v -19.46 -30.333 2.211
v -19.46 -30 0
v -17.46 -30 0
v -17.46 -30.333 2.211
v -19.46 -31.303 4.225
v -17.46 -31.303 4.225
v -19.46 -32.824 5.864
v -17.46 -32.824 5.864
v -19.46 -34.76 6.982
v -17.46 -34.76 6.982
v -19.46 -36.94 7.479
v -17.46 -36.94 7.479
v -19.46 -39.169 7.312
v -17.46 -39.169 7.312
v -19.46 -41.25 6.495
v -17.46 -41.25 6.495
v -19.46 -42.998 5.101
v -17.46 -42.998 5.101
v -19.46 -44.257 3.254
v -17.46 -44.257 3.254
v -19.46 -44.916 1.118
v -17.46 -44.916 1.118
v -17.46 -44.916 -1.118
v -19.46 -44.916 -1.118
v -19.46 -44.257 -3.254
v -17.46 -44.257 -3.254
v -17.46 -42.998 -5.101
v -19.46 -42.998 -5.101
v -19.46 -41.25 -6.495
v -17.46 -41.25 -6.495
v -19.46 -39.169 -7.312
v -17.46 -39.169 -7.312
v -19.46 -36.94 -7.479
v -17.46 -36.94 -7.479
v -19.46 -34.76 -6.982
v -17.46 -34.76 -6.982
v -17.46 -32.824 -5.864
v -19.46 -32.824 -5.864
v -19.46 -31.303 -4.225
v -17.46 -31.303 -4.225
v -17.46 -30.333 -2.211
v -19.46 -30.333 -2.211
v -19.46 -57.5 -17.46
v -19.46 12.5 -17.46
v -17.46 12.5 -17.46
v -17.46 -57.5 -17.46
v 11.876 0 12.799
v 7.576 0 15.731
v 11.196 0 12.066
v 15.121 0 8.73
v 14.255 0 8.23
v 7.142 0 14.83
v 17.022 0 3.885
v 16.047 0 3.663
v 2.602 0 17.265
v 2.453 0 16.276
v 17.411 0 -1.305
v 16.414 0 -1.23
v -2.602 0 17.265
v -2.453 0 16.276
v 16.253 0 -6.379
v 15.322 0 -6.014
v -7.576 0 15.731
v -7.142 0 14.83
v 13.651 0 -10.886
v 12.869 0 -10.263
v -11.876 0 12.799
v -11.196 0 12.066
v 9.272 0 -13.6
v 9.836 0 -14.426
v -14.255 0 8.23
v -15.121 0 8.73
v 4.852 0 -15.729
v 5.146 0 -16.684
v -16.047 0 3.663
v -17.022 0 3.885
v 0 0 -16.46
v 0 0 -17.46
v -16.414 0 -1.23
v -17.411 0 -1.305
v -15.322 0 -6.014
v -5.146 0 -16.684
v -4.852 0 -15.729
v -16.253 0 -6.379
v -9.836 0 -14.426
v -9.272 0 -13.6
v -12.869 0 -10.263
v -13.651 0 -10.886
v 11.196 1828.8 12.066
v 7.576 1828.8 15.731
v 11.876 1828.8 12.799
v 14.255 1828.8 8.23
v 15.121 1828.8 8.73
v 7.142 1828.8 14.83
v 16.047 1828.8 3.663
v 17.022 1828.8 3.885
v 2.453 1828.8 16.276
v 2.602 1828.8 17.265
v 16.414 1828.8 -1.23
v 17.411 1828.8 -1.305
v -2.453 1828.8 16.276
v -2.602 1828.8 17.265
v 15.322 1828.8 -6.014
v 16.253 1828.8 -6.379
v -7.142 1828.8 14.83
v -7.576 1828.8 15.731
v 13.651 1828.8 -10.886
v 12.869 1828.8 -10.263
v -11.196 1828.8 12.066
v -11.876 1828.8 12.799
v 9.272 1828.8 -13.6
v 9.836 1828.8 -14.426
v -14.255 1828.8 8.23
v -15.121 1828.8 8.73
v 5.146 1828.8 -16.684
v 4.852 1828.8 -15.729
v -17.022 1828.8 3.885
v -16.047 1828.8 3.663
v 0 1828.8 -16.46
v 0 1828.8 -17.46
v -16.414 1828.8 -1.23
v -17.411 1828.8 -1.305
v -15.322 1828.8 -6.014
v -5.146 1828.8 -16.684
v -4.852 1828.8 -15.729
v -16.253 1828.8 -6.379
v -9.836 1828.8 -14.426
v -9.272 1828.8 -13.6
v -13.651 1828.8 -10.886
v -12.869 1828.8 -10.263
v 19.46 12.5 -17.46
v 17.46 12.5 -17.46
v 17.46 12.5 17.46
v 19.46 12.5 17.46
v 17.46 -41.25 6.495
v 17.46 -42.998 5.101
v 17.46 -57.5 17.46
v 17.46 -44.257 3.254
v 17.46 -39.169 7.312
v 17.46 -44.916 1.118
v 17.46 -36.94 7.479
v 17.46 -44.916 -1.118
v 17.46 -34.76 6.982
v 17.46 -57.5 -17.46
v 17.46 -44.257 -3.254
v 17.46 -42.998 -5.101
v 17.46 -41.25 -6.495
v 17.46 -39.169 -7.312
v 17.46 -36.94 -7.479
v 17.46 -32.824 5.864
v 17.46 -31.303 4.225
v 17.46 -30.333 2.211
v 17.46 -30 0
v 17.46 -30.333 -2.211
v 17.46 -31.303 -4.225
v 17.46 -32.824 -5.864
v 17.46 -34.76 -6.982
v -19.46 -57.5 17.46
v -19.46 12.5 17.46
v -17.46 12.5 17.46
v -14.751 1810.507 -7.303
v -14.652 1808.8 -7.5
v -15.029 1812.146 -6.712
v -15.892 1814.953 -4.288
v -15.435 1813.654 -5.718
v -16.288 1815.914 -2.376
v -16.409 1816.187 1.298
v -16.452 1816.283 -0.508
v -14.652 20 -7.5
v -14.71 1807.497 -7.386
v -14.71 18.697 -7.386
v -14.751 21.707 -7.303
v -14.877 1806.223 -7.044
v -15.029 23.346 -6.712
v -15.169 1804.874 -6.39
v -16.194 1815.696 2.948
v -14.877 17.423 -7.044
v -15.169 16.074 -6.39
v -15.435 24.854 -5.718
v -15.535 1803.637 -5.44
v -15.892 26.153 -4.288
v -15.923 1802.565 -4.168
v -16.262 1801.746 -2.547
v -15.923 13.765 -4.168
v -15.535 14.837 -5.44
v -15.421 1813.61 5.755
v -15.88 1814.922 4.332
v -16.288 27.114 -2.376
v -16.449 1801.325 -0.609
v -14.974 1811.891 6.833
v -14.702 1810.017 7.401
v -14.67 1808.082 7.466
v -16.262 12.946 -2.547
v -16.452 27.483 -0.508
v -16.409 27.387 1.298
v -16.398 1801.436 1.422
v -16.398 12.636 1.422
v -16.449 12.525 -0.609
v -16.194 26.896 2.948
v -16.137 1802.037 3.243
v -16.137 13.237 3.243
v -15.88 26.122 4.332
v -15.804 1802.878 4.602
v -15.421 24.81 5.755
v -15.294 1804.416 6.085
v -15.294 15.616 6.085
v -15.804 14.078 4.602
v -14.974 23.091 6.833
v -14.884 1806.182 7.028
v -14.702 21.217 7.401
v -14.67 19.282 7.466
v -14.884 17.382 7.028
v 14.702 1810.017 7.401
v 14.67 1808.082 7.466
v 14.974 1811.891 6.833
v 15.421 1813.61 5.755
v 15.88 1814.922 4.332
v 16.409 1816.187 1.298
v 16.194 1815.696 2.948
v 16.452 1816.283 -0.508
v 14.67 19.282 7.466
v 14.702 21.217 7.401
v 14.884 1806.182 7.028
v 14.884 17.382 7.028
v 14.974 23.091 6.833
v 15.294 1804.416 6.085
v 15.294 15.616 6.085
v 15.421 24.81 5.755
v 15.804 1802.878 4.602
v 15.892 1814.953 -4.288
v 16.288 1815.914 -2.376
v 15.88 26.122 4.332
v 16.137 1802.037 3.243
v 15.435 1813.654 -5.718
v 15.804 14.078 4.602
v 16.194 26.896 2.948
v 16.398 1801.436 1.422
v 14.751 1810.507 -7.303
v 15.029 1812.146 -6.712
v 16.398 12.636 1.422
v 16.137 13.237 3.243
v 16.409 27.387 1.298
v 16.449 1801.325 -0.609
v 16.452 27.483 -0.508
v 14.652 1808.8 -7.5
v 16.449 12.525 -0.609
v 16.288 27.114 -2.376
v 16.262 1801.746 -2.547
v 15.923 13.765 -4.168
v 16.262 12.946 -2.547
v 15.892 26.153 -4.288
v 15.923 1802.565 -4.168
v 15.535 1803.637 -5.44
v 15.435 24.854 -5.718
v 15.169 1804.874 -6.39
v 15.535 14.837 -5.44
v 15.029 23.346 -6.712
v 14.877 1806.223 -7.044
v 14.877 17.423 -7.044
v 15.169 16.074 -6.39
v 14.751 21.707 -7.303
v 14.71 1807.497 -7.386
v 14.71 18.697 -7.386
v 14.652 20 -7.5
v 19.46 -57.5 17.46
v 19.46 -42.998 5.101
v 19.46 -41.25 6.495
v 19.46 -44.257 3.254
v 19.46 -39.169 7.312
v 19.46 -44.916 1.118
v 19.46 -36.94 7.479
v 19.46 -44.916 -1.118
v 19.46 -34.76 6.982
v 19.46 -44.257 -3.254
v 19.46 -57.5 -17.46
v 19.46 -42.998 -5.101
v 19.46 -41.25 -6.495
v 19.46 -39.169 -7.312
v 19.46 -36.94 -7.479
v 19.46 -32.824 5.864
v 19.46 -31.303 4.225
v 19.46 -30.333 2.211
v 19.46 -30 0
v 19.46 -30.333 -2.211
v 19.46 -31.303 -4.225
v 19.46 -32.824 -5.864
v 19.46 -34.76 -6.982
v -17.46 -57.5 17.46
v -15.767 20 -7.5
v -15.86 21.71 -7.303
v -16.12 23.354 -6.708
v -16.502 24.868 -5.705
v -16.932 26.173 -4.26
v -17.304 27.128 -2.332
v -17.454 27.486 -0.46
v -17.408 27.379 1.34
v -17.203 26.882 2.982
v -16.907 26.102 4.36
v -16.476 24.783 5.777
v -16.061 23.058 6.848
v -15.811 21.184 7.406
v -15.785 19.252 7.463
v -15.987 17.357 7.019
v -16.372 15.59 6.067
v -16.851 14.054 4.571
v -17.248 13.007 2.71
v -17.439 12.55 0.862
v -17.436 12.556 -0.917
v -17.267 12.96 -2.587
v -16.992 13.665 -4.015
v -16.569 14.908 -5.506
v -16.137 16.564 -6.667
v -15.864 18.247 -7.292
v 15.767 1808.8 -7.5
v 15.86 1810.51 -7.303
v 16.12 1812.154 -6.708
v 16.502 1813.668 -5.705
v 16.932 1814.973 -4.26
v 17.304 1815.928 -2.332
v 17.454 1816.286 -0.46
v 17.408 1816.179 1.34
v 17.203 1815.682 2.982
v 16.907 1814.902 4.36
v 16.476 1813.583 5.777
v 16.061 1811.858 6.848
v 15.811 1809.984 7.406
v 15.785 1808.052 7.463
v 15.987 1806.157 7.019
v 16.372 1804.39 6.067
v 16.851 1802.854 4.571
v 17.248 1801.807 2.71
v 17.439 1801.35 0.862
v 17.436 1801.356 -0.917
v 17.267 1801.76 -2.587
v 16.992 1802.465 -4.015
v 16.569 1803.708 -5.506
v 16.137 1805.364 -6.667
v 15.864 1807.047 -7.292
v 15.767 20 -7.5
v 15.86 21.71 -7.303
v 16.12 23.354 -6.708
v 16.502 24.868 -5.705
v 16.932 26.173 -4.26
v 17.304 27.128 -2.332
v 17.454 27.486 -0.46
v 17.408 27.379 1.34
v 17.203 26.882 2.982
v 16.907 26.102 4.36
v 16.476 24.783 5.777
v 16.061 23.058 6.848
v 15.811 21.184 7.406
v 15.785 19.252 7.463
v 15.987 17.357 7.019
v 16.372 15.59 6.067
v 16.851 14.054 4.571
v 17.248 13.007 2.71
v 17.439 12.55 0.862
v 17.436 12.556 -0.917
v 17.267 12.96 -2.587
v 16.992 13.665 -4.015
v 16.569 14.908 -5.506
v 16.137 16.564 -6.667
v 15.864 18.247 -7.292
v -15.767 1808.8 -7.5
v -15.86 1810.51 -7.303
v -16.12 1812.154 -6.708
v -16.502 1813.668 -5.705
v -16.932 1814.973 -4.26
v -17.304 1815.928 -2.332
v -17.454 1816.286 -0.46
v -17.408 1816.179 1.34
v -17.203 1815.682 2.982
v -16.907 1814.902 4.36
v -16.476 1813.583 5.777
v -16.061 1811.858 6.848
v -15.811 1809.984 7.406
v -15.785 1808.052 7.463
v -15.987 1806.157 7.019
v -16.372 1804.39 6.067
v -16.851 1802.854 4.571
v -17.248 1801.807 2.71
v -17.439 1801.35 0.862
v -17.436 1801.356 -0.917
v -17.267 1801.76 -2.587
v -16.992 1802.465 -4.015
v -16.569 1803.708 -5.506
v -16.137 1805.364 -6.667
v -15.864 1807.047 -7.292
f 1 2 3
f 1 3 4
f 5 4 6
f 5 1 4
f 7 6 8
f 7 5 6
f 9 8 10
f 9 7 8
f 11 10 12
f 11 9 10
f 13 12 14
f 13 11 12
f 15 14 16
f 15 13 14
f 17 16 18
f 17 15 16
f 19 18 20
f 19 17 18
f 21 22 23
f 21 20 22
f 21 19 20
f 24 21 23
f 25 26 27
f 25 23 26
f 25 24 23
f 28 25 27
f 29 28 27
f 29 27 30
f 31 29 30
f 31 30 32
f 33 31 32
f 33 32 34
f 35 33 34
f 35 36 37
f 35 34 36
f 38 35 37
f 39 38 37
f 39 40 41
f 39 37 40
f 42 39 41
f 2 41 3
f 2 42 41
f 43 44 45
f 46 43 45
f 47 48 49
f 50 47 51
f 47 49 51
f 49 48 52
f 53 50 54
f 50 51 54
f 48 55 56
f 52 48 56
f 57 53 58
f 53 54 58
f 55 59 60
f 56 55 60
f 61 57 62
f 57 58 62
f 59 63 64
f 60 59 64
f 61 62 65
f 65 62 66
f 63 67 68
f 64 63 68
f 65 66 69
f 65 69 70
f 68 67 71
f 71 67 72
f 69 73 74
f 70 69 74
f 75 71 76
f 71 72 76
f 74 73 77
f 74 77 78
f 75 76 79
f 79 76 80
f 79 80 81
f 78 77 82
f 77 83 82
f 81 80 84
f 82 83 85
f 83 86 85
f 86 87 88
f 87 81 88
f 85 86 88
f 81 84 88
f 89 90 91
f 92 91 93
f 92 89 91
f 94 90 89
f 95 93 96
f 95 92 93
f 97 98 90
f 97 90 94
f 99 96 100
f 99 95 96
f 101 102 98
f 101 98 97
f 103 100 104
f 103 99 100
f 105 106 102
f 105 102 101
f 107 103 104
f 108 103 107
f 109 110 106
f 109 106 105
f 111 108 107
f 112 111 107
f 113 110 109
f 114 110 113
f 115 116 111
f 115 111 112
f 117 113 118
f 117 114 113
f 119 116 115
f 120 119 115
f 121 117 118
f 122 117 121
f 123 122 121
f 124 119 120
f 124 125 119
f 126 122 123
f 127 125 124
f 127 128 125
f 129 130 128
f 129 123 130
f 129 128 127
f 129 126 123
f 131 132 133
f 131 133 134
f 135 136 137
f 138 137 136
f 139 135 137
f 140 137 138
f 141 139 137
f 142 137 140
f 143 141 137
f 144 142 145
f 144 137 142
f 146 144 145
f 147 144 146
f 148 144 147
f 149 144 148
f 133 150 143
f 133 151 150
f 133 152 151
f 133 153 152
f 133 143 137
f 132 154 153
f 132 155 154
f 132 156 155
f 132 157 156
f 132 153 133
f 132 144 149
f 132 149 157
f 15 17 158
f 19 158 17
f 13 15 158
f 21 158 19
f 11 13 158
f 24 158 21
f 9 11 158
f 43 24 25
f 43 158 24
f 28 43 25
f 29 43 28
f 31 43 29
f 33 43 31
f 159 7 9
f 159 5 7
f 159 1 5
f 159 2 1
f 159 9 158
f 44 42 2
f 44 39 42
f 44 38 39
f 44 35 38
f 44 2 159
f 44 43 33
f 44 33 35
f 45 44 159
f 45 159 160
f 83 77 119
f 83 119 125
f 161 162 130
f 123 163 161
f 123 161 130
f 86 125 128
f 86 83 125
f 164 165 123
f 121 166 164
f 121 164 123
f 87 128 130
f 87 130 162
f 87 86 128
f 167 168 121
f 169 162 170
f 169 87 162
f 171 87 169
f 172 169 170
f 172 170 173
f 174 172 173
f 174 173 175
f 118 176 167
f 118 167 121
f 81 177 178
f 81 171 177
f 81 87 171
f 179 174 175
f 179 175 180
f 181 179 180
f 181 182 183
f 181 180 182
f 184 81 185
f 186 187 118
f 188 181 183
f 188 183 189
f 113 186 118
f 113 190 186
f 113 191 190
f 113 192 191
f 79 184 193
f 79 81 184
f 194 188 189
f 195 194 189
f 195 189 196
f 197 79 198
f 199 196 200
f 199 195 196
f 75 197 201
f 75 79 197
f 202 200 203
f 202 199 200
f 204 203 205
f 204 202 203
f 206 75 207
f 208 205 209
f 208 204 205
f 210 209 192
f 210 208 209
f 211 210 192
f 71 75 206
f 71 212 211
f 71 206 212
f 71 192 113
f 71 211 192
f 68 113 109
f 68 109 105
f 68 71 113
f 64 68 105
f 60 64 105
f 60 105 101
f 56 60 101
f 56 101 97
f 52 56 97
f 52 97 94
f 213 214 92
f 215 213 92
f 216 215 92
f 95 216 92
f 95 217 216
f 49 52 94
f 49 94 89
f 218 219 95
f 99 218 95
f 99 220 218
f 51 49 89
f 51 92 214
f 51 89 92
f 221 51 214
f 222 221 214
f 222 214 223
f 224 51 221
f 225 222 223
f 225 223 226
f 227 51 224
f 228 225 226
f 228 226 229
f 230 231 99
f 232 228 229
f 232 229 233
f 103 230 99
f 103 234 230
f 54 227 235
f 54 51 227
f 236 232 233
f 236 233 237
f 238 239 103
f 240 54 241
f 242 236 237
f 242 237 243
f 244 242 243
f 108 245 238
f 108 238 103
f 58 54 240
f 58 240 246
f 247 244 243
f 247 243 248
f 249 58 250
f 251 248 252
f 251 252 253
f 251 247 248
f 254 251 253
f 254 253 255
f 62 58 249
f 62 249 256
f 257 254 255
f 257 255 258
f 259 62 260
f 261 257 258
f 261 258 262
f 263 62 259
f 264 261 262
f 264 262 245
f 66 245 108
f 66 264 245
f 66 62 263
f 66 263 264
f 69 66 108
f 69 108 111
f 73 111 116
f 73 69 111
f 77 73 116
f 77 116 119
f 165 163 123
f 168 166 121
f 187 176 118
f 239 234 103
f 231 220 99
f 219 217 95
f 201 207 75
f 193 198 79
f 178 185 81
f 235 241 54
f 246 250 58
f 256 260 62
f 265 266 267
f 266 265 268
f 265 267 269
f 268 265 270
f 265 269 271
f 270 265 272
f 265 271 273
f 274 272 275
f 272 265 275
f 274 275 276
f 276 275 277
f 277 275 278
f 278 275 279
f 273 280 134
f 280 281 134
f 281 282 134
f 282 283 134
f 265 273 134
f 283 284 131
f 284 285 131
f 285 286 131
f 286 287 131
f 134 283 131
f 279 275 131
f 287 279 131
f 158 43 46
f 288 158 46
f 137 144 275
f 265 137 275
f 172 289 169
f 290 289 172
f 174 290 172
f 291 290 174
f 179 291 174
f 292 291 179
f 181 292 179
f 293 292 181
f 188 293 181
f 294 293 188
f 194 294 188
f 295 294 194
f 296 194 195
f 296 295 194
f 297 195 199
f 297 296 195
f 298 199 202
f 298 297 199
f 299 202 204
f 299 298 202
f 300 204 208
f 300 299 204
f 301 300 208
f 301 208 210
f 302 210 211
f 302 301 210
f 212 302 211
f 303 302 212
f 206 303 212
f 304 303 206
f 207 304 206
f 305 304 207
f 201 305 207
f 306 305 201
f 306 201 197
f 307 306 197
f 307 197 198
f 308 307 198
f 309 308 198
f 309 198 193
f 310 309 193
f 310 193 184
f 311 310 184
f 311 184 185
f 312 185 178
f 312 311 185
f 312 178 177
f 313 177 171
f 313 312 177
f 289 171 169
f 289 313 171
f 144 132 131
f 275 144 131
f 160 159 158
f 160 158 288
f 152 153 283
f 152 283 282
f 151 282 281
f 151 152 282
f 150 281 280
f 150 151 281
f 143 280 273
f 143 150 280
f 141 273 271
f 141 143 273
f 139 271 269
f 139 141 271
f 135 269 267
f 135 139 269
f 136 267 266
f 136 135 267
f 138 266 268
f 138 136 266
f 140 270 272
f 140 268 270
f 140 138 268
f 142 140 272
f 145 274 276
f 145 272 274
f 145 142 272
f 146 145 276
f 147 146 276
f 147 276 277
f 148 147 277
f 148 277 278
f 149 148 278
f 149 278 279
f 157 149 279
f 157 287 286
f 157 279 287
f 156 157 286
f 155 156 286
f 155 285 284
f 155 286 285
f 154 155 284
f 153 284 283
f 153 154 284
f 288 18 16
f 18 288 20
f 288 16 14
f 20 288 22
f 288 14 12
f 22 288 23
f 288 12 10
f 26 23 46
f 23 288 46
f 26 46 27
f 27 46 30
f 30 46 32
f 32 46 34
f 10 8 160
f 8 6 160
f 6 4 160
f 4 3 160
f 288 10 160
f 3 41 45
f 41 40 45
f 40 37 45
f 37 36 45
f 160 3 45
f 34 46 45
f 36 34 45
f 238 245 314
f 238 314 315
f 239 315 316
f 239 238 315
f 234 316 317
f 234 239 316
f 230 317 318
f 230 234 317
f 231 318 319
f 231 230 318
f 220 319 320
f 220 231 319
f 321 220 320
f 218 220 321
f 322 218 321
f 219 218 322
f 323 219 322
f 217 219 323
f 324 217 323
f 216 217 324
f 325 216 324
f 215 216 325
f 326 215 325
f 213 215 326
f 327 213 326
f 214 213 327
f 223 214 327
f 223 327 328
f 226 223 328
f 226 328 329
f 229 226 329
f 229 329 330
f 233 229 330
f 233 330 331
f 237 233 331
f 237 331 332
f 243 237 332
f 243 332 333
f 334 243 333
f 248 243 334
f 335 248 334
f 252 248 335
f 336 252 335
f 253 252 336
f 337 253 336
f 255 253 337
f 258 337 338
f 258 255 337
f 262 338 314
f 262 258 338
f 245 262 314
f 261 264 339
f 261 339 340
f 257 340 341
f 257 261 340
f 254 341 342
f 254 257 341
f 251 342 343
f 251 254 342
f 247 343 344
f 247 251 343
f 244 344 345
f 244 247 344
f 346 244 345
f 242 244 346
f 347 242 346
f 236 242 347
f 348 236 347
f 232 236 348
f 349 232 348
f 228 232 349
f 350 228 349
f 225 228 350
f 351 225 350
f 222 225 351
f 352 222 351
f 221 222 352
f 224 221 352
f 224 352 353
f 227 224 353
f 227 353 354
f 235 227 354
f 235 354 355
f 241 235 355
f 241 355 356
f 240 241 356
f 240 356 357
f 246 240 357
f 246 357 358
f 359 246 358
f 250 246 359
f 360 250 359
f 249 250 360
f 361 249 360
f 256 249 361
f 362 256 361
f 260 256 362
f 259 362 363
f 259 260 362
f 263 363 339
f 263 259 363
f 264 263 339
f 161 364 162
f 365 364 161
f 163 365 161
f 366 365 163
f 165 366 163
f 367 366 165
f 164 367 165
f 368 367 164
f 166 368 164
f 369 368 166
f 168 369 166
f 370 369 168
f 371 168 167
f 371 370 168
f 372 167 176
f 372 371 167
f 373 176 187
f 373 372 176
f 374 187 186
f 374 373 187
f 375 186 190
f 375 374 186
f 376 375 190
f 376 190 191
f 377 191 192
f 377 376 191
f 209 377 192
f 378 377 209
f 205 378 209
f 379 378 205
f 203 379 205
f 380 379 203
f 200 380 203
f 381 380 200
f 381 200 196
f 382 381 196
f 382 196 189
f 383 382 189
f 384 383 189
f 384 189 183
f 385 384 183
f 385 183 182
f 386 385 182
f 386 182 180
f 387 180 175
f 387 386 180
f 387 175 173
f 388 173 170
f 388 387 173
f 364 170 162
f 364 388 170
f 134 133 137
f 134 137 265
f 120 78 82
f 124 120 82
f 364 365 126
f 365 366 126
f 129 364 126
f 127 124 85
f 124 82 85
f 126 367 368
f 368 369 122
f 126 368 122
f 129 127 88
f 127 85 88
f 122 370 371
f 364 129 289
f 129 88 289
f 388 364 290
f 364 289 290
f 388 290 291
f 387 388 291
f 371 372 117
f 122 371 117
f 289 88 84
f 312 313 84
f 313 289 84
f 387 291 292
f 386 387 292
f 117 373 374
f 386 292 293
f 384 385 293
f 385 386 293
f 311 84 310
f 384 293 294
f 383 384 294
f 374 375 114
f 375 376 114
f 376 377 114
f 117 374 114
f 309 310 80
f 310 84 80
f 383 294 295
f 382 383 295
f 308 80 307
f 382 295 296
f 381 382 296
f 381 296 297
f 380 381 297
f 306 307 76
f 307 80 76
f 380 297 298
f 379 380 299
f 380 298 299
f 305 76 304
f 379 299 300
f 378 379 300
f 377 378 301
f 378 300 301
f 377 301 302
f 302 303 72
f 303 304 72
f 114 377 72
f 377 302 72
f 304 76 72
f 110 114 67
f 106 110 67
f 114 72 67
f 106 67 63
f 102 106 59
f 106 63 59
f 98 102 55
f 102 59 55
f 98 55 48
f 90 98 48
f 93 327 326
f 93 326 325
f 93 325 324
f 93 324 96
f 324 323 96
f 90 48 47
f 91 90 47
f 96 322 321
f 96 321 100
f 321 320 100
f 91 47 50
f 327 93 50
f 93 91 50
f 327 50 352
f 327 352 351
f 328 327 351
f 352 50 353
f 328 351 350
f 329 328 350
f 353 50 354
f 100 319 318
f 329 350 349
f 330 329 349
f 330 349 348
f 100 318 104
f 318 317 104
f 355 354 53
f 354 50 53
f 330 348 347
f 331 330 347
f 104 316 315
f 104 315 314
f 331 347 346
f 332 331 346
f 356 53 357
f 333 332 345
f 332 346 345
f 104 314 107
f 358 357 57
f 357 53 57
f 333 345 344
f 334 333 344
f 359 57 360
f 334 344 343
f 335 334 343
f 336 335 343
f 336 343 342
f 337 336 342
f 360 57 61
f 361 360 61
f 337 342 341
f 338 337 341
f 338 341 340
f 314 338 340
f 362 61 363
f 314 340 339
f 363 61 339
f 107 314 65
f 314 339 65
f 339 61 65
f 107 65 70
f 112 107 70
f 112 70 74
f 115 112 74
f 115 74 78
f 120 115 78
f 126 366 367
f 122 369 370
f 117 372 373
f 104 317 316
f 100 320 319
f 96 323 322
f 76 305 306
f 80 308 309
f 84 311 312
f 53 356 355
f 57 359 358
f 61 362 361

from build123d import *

# Parameters (mm, degrees)
SKETCH1_R                  = 17.46
SKETCH1_R_2                = 16.46
BOSS_EXTRUDE1_DEPTH        = 1828.8
CUT_EXTRUDE1_DEPTH         = 1829.966687285
CUT_EXTRUDE1_DEPTH_BACK    = 1829.966687285
SKETCH2_R                  = 7.5
BOSS_EXTRUDE2_DEPTH        = 17.46
BOSS_EXTRUDE2_DEPTH_BACK   = 17.46
SKETCH3_W                  = 2
SKETCH3_H                  = 70
BOSS_EXTRUDE2_2_DEPTH      = 17.46
BOSS_EXTRUDE2_2_DEPTH_BACK = 17.46
CUT_EXTRUDE2_DEPTH         = 1830.297422064
CUT_EXTRUDE2_DEPTH_BACK    = 1830.297422064
SKETCH4_R                  = 7.5


with BuildPart() as part:
    # Sketch1 → Boss-Extrude1 (new body)
    with BuildSketch(Plane(origin=(0, 0, 0), x_dir=(1, 0, 0), z_dir=(0, 1, 0))):
        Circle(SKETCH1_R)
        Circle(SKETCH1_R_2, mode=Mode.SUBTRACT)
    extrude(amount=BOSS_EXTRUDE1_DEPTH)

    # Sketch2 → Cut-Extrude1 (cut, two sides: drawn at the far end of the back side and taken through both)
    with BuildSketch(Plane(origin=(0, 0, 0), x_dir=(0, 0, -1), z_dir=(1, 0, 0)).offset(-CUT_EXTRUDE1_DEPTH_BACK)):
        with Locations((0, 1808.8)):
            Circle(SKETCH2_R)
        with Locations((0, 20)):
            Circle(SKETCH2_R)
    extrude(amount=CUT_EXTRUDE1_DEPTH + CUT_EXTRUDE1_DEPTH_BACK, mode=Mode.SUBTRACT)


with BuildPart() as body_2:
    # Sketch3 → Boss-Extrude2 (new, two sides: drawn at the far end of the back side and taken through both)
    with BuildSketch(Plane.XY.offset(-BOSS_EXTRUDE2_DEPTH_BACK)):
        with Locations((-18.46, -22.5)):
            Rectangle(SKETCH3_W, SKETCH3_H)
    extrude(amount=BOSS_EXTRUDE2_DEPTH + BOSS_EXTRUDE2_DEPTH_BACK)


with BuildPart() as body_3:
    # Sketch3 → Boss-Extrude2 2 (new, two sides: drawn at the far end of the back side and taken through both)
    with BuildSketch(Plane.XY.offset(-BOSS_EXTRUDE2_2_DEPTH_BACK)):
        with Locations((18.46, -22.5)):
            Rectangle(SKETCH3_W, SKETCH3_H)
    extrude(amount=BOSS_EXTRUDE2_2_DEPTH + BOSS_EXTRUDE2_2_DEPTH_BACK)


with BuildPart() as cut_extrude2_tool:
    # Sketch4 → Cut-Extrude2 (new, two sides: drawn at the far end of the back side and taken through both)
    with BuildSketch(Plane(origin=(19.46, 0, 0), x_dir=(0, 0, -1), z_dir=(1, 0, 0)).offset(-CUT_EXTRUDE2_DEPTH_BACK)):
        with Locations((0, -37.5)):
            Circle(SKETCH4_R)
    extrude(amount=CUT_EXTRUDE2_DEPTH + CUT_EXTRUDE2_DEPTH_BACK)


with BuildPart() as body_2_1:
    add(body_2.part)

    # Cut-Extrude2: cut by cut_extrude2_tool
    add(cut_extrude2_tool.part, mode=Mode.SUBTRACT)


with BuildPart() as body_3_1:
    add(body_3.part)

    # Cut-Extrude2: cut by cut_extrude2_tool
    add(cut_extrude2_tool.part, mode=Mode.SUBTRACT)


solid = Compound([part.part, body_2_1.part, body_3_1.part])
